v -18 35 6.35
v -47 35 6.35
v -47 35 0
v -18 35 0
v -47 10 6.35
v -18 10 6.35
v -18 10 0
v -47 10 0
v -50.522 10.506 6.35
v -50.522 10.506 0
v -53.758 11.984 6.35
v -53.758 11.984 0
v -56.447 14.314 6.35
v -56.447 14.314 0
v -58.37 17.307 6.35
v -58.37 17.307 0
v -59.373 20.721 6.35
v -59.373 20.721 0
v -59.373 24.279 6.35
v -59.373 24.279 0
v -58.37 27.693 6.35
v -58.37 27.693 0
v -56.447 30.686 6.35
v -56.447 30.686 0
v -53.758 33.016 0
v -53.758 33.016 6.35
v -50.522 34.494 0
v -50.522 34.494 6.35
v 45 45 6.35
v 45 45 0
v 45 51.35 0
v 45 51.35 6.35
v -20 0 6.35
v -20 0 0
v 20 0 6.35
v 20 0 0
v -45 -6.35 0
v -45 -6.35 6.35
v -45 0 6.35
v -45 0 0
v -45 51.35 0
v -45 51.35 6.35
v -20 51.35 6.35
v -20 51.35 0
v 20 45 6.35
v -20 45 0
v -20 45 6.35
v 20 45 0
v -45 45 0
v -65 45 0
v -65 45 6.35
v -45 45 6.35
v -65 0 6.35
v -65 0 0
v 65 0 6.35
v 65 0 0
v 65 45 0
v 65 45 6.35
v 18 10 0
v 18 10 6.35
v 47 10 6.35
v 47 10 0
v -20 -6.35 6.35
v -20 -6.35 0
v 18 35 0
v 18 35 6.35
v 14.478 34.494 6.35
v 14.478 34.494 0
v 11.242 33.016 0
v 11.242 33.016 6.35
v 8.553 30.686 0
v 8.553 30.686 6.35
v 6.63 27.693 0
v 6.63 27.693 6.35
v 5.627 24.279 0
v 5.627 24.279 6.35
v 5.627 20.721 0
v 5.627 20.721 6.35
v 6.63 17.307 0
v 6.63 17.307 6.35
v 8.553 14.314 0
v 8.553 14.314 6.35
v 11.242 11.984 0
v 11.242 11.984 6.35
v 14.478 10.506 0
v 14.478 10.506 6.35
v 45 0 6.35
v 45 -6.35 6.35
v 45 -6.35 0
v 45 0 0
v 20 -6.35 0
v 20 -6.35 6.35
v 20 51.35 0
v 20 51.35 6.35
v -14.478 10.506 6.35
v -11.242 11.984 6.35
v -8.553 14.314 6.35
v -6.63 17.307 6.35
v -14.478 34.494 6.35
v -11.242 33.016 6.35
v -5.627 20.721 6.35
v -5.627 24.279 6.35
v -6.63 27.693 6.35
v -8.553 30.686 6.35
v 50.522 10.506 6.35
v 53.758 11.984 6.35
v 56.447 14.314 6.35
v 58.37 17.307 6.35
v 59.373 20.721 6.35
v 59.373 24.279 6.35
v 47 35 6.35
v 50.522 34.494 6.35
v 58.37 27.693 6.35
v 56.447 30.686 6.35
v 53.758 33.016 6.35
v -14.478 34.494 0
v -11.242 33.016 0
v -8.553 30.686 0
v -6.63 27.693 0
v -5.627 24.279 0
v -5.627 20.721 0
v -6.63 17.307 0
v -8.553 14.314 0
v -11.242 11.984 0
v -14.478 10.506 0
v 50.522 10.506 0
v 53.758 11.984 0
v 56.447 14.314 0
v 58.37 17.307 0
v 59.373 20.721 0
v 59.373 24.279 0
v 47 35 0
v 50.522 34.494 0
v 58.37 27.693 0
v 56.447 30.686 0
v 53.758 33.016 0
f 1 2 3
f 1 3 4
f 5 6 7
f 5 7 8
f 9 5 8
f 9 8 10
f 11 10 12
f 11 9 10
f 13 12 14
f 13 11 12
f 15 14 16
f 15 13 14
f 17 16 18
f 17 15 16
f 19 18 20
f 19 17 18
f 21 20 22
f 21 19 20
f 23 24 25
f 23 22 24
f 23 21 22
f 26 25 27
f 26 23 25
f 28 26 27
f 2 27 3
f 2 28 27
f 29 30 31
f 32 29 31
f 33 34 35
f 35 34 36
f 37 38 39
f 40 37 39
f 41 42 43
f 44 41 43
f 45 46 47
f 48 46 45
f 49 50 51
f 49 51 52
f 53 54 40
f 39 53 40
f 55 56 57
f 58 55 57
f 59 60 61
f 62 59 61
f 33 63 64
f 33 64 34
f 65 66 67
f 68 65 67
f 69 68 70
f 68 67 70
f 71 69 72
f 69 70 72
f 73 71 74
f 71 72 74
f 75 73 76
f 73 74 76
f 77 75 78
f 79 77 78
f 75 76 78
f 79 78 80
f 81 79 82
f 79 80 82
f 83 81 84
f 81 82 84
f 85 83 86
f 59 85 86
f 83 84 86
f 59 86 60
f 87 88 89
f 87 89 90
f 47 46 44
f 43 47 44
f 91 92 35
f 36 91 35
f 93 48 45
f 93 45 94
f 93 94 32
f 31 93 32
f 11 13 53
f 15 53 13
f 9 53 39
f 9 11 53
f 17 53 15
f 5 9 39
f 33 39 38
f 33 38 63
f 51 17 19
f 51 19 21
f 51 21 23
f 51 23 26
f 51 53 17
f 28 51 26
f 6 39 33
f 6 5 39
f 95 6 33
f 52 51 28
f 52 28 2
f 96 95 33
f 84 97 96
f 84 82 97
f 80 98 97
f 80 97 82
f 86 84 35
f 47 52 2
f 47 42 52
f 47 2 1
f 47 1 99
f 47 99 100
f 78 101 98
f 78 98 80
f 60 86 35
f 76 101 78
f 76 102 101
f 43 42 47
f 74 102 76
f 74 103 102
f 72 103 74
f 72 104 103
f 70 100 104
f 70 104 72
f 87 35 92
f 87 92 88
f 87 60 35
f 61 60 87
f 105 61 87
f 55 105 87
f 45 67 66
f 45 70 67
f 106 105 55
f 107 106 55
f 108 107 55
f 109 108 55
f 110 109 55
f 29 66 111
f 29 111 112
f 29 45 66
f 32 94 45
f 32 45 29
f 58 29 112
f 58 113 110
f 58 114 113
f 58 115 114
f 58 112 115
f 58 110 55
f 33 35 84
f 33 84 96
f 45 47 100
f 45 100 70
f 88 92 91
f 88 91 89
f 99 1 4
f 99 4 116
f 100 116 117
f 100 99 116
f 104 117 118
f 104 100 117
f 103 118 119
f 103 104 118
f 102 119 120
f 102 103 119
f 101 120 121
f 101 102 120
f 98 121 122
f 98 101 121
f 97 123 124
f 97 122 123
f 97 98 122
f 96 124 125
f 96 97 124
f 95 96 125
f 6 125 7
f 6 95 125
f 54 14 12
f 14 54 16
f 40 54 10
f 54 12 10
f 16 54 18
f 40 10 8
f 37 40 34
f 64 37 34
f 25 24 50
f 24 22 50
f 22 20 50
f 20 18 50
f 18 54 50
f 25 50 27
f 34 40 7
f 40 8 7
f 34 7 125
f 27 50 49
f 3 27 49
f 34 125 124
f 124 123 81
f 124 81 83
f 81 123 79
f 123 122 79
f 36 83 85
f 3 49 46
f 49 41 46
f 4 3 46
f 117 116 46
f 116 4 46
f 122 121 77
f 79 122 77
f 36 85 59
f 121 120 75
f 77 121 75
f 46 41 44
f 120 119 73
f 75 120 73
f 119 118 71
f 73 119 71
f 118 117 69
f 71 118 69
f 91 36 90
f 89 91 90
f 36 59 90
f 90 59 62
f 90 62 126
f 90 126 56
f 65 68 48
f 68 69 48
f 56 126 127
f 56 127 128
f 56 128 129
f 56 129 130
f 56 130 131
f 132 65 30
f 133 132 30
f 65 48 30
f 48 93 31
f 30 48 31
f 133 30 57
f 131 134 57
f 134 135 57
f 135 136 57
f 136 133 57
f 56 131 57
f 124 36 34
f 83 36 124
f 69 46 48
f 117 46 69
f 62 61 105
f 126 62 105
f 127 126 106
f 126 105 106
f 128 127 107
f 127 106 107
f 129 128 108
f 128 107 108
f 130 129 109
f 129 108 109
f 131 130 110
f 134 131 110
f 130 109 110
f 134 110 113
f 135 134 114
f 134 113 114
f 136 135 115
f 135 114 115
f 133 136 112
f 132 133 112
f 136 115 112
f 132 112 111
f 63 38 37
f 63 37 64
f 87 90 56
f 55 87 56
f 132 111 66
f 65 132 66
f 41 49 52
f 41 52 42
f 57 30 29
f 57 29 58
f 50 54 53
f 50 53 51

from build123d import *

# Parameters (mm, degrees)
ESQUISSE1_W             = 130
ESQUISSE1_H             = 45
BOSS_EXTRU_1_DEPTH      = 6.35
ENL_V_MAT_EXTRU_1_REACH = 81.312
ESQUISSE3_W             = 25
ESQUISSE3_H             = 6.35
BOSS_EXTRU_2_DEPTH      = 6.35


with BuildPart() as part:
    # Esquisse1 → Boss.-Extru.1 (new body)
    with BuildSketch(Plane.XY):
        with Locations((0, 22.5)):
            Rectangle(ESQUISSE1_W, ESQUISSE1_H)
    extrude(amount=BOSS_EXTRU_1_DEPTH)

    # Esquisse2 → Enlèv. mat.-Extru.1 (cut, up to next)
    with BuildSketch(Plane.XY.offset(6.35), mode=Mode.PRIVATE) as enl_v_mat_extru_1_sk1:
        with BuildLine():
            Line((-47, 35), (-18, 35))
            ThreePointArc((-18, 35), (-5.5, 22.5), (-18, 10))
            Line((-18, 10), (-47, 10))
            ThreePointArc((-47, 10), (-59.5, 22.5), (-47, 35))
        make_face()
    enl_v_mat_extru_1_tool1 = extrude(enl_v_mat_extru_1_sk1.sketch, amount=-ENL_V_MAT_EXTRU_1_REACH, mode=Mode.PRIVATE) & part.part
    # Esquisse2 → Enlèv. mat.-Extru.1 (cut, up to next)
    with BuildSketch(Plane.XY.offset(6.35), mode=Mode.PRIVATE) as enl_v_mat_extru_1_sk2:
        with BuildLine():
            Line((47, 35), (18, 35))
            ThreePointArc((18, 35), (5.5, 22.5), (18, 10))
            Line((18, 10), (47, 10))
            ThreePointArc((47, 10), (59.5, 22.5), (47, 35))
        make_face()
    enl_v_mat_extru_1_tool2 = extrude(enl_v_mat_extru_1_sk2.sketch, amount=-ENL_V_MAT_EXTRU_1_REACH, mode=Mode.PRIVATE) & part.part
    add(enl_v_mat_extru_1_tool1.solids().sort_by_distance((-32.5, 22.5, 6.35))[0], mode=Mode.SUBTRACT)
    add(enl_v_mat_extru_1_tool2.solids().sort_by_distance((32.5, 22.5, 6.35))[0], mode=Mode.SUBTRACT)

    # Esquisse3 → Boss.-Extru.2 (add)
    with BuildSketch(Plane.XY.offset(6.35)):
        with Locations((-32.5, 48.175)):
            Rectangle(ESQUISSE3_W, ESQUISSE3_H)
        with Locations((-32.5, -3.175)):
            Rectangle(ESQUISSE3_W, ESQUISSE3_H)
        with Locations((32.5, 48.175)):
            Rectangle(ESQUISSE3_W, ESQUISSE3_H)
        with Locations((32.5, -3.175)):
            Rectangle(ESQUISSE3_W, ESQUISSE3_H)
    extrude(amount=-BOSS_EXTRU_2_DEPTH)


solid = part.part
